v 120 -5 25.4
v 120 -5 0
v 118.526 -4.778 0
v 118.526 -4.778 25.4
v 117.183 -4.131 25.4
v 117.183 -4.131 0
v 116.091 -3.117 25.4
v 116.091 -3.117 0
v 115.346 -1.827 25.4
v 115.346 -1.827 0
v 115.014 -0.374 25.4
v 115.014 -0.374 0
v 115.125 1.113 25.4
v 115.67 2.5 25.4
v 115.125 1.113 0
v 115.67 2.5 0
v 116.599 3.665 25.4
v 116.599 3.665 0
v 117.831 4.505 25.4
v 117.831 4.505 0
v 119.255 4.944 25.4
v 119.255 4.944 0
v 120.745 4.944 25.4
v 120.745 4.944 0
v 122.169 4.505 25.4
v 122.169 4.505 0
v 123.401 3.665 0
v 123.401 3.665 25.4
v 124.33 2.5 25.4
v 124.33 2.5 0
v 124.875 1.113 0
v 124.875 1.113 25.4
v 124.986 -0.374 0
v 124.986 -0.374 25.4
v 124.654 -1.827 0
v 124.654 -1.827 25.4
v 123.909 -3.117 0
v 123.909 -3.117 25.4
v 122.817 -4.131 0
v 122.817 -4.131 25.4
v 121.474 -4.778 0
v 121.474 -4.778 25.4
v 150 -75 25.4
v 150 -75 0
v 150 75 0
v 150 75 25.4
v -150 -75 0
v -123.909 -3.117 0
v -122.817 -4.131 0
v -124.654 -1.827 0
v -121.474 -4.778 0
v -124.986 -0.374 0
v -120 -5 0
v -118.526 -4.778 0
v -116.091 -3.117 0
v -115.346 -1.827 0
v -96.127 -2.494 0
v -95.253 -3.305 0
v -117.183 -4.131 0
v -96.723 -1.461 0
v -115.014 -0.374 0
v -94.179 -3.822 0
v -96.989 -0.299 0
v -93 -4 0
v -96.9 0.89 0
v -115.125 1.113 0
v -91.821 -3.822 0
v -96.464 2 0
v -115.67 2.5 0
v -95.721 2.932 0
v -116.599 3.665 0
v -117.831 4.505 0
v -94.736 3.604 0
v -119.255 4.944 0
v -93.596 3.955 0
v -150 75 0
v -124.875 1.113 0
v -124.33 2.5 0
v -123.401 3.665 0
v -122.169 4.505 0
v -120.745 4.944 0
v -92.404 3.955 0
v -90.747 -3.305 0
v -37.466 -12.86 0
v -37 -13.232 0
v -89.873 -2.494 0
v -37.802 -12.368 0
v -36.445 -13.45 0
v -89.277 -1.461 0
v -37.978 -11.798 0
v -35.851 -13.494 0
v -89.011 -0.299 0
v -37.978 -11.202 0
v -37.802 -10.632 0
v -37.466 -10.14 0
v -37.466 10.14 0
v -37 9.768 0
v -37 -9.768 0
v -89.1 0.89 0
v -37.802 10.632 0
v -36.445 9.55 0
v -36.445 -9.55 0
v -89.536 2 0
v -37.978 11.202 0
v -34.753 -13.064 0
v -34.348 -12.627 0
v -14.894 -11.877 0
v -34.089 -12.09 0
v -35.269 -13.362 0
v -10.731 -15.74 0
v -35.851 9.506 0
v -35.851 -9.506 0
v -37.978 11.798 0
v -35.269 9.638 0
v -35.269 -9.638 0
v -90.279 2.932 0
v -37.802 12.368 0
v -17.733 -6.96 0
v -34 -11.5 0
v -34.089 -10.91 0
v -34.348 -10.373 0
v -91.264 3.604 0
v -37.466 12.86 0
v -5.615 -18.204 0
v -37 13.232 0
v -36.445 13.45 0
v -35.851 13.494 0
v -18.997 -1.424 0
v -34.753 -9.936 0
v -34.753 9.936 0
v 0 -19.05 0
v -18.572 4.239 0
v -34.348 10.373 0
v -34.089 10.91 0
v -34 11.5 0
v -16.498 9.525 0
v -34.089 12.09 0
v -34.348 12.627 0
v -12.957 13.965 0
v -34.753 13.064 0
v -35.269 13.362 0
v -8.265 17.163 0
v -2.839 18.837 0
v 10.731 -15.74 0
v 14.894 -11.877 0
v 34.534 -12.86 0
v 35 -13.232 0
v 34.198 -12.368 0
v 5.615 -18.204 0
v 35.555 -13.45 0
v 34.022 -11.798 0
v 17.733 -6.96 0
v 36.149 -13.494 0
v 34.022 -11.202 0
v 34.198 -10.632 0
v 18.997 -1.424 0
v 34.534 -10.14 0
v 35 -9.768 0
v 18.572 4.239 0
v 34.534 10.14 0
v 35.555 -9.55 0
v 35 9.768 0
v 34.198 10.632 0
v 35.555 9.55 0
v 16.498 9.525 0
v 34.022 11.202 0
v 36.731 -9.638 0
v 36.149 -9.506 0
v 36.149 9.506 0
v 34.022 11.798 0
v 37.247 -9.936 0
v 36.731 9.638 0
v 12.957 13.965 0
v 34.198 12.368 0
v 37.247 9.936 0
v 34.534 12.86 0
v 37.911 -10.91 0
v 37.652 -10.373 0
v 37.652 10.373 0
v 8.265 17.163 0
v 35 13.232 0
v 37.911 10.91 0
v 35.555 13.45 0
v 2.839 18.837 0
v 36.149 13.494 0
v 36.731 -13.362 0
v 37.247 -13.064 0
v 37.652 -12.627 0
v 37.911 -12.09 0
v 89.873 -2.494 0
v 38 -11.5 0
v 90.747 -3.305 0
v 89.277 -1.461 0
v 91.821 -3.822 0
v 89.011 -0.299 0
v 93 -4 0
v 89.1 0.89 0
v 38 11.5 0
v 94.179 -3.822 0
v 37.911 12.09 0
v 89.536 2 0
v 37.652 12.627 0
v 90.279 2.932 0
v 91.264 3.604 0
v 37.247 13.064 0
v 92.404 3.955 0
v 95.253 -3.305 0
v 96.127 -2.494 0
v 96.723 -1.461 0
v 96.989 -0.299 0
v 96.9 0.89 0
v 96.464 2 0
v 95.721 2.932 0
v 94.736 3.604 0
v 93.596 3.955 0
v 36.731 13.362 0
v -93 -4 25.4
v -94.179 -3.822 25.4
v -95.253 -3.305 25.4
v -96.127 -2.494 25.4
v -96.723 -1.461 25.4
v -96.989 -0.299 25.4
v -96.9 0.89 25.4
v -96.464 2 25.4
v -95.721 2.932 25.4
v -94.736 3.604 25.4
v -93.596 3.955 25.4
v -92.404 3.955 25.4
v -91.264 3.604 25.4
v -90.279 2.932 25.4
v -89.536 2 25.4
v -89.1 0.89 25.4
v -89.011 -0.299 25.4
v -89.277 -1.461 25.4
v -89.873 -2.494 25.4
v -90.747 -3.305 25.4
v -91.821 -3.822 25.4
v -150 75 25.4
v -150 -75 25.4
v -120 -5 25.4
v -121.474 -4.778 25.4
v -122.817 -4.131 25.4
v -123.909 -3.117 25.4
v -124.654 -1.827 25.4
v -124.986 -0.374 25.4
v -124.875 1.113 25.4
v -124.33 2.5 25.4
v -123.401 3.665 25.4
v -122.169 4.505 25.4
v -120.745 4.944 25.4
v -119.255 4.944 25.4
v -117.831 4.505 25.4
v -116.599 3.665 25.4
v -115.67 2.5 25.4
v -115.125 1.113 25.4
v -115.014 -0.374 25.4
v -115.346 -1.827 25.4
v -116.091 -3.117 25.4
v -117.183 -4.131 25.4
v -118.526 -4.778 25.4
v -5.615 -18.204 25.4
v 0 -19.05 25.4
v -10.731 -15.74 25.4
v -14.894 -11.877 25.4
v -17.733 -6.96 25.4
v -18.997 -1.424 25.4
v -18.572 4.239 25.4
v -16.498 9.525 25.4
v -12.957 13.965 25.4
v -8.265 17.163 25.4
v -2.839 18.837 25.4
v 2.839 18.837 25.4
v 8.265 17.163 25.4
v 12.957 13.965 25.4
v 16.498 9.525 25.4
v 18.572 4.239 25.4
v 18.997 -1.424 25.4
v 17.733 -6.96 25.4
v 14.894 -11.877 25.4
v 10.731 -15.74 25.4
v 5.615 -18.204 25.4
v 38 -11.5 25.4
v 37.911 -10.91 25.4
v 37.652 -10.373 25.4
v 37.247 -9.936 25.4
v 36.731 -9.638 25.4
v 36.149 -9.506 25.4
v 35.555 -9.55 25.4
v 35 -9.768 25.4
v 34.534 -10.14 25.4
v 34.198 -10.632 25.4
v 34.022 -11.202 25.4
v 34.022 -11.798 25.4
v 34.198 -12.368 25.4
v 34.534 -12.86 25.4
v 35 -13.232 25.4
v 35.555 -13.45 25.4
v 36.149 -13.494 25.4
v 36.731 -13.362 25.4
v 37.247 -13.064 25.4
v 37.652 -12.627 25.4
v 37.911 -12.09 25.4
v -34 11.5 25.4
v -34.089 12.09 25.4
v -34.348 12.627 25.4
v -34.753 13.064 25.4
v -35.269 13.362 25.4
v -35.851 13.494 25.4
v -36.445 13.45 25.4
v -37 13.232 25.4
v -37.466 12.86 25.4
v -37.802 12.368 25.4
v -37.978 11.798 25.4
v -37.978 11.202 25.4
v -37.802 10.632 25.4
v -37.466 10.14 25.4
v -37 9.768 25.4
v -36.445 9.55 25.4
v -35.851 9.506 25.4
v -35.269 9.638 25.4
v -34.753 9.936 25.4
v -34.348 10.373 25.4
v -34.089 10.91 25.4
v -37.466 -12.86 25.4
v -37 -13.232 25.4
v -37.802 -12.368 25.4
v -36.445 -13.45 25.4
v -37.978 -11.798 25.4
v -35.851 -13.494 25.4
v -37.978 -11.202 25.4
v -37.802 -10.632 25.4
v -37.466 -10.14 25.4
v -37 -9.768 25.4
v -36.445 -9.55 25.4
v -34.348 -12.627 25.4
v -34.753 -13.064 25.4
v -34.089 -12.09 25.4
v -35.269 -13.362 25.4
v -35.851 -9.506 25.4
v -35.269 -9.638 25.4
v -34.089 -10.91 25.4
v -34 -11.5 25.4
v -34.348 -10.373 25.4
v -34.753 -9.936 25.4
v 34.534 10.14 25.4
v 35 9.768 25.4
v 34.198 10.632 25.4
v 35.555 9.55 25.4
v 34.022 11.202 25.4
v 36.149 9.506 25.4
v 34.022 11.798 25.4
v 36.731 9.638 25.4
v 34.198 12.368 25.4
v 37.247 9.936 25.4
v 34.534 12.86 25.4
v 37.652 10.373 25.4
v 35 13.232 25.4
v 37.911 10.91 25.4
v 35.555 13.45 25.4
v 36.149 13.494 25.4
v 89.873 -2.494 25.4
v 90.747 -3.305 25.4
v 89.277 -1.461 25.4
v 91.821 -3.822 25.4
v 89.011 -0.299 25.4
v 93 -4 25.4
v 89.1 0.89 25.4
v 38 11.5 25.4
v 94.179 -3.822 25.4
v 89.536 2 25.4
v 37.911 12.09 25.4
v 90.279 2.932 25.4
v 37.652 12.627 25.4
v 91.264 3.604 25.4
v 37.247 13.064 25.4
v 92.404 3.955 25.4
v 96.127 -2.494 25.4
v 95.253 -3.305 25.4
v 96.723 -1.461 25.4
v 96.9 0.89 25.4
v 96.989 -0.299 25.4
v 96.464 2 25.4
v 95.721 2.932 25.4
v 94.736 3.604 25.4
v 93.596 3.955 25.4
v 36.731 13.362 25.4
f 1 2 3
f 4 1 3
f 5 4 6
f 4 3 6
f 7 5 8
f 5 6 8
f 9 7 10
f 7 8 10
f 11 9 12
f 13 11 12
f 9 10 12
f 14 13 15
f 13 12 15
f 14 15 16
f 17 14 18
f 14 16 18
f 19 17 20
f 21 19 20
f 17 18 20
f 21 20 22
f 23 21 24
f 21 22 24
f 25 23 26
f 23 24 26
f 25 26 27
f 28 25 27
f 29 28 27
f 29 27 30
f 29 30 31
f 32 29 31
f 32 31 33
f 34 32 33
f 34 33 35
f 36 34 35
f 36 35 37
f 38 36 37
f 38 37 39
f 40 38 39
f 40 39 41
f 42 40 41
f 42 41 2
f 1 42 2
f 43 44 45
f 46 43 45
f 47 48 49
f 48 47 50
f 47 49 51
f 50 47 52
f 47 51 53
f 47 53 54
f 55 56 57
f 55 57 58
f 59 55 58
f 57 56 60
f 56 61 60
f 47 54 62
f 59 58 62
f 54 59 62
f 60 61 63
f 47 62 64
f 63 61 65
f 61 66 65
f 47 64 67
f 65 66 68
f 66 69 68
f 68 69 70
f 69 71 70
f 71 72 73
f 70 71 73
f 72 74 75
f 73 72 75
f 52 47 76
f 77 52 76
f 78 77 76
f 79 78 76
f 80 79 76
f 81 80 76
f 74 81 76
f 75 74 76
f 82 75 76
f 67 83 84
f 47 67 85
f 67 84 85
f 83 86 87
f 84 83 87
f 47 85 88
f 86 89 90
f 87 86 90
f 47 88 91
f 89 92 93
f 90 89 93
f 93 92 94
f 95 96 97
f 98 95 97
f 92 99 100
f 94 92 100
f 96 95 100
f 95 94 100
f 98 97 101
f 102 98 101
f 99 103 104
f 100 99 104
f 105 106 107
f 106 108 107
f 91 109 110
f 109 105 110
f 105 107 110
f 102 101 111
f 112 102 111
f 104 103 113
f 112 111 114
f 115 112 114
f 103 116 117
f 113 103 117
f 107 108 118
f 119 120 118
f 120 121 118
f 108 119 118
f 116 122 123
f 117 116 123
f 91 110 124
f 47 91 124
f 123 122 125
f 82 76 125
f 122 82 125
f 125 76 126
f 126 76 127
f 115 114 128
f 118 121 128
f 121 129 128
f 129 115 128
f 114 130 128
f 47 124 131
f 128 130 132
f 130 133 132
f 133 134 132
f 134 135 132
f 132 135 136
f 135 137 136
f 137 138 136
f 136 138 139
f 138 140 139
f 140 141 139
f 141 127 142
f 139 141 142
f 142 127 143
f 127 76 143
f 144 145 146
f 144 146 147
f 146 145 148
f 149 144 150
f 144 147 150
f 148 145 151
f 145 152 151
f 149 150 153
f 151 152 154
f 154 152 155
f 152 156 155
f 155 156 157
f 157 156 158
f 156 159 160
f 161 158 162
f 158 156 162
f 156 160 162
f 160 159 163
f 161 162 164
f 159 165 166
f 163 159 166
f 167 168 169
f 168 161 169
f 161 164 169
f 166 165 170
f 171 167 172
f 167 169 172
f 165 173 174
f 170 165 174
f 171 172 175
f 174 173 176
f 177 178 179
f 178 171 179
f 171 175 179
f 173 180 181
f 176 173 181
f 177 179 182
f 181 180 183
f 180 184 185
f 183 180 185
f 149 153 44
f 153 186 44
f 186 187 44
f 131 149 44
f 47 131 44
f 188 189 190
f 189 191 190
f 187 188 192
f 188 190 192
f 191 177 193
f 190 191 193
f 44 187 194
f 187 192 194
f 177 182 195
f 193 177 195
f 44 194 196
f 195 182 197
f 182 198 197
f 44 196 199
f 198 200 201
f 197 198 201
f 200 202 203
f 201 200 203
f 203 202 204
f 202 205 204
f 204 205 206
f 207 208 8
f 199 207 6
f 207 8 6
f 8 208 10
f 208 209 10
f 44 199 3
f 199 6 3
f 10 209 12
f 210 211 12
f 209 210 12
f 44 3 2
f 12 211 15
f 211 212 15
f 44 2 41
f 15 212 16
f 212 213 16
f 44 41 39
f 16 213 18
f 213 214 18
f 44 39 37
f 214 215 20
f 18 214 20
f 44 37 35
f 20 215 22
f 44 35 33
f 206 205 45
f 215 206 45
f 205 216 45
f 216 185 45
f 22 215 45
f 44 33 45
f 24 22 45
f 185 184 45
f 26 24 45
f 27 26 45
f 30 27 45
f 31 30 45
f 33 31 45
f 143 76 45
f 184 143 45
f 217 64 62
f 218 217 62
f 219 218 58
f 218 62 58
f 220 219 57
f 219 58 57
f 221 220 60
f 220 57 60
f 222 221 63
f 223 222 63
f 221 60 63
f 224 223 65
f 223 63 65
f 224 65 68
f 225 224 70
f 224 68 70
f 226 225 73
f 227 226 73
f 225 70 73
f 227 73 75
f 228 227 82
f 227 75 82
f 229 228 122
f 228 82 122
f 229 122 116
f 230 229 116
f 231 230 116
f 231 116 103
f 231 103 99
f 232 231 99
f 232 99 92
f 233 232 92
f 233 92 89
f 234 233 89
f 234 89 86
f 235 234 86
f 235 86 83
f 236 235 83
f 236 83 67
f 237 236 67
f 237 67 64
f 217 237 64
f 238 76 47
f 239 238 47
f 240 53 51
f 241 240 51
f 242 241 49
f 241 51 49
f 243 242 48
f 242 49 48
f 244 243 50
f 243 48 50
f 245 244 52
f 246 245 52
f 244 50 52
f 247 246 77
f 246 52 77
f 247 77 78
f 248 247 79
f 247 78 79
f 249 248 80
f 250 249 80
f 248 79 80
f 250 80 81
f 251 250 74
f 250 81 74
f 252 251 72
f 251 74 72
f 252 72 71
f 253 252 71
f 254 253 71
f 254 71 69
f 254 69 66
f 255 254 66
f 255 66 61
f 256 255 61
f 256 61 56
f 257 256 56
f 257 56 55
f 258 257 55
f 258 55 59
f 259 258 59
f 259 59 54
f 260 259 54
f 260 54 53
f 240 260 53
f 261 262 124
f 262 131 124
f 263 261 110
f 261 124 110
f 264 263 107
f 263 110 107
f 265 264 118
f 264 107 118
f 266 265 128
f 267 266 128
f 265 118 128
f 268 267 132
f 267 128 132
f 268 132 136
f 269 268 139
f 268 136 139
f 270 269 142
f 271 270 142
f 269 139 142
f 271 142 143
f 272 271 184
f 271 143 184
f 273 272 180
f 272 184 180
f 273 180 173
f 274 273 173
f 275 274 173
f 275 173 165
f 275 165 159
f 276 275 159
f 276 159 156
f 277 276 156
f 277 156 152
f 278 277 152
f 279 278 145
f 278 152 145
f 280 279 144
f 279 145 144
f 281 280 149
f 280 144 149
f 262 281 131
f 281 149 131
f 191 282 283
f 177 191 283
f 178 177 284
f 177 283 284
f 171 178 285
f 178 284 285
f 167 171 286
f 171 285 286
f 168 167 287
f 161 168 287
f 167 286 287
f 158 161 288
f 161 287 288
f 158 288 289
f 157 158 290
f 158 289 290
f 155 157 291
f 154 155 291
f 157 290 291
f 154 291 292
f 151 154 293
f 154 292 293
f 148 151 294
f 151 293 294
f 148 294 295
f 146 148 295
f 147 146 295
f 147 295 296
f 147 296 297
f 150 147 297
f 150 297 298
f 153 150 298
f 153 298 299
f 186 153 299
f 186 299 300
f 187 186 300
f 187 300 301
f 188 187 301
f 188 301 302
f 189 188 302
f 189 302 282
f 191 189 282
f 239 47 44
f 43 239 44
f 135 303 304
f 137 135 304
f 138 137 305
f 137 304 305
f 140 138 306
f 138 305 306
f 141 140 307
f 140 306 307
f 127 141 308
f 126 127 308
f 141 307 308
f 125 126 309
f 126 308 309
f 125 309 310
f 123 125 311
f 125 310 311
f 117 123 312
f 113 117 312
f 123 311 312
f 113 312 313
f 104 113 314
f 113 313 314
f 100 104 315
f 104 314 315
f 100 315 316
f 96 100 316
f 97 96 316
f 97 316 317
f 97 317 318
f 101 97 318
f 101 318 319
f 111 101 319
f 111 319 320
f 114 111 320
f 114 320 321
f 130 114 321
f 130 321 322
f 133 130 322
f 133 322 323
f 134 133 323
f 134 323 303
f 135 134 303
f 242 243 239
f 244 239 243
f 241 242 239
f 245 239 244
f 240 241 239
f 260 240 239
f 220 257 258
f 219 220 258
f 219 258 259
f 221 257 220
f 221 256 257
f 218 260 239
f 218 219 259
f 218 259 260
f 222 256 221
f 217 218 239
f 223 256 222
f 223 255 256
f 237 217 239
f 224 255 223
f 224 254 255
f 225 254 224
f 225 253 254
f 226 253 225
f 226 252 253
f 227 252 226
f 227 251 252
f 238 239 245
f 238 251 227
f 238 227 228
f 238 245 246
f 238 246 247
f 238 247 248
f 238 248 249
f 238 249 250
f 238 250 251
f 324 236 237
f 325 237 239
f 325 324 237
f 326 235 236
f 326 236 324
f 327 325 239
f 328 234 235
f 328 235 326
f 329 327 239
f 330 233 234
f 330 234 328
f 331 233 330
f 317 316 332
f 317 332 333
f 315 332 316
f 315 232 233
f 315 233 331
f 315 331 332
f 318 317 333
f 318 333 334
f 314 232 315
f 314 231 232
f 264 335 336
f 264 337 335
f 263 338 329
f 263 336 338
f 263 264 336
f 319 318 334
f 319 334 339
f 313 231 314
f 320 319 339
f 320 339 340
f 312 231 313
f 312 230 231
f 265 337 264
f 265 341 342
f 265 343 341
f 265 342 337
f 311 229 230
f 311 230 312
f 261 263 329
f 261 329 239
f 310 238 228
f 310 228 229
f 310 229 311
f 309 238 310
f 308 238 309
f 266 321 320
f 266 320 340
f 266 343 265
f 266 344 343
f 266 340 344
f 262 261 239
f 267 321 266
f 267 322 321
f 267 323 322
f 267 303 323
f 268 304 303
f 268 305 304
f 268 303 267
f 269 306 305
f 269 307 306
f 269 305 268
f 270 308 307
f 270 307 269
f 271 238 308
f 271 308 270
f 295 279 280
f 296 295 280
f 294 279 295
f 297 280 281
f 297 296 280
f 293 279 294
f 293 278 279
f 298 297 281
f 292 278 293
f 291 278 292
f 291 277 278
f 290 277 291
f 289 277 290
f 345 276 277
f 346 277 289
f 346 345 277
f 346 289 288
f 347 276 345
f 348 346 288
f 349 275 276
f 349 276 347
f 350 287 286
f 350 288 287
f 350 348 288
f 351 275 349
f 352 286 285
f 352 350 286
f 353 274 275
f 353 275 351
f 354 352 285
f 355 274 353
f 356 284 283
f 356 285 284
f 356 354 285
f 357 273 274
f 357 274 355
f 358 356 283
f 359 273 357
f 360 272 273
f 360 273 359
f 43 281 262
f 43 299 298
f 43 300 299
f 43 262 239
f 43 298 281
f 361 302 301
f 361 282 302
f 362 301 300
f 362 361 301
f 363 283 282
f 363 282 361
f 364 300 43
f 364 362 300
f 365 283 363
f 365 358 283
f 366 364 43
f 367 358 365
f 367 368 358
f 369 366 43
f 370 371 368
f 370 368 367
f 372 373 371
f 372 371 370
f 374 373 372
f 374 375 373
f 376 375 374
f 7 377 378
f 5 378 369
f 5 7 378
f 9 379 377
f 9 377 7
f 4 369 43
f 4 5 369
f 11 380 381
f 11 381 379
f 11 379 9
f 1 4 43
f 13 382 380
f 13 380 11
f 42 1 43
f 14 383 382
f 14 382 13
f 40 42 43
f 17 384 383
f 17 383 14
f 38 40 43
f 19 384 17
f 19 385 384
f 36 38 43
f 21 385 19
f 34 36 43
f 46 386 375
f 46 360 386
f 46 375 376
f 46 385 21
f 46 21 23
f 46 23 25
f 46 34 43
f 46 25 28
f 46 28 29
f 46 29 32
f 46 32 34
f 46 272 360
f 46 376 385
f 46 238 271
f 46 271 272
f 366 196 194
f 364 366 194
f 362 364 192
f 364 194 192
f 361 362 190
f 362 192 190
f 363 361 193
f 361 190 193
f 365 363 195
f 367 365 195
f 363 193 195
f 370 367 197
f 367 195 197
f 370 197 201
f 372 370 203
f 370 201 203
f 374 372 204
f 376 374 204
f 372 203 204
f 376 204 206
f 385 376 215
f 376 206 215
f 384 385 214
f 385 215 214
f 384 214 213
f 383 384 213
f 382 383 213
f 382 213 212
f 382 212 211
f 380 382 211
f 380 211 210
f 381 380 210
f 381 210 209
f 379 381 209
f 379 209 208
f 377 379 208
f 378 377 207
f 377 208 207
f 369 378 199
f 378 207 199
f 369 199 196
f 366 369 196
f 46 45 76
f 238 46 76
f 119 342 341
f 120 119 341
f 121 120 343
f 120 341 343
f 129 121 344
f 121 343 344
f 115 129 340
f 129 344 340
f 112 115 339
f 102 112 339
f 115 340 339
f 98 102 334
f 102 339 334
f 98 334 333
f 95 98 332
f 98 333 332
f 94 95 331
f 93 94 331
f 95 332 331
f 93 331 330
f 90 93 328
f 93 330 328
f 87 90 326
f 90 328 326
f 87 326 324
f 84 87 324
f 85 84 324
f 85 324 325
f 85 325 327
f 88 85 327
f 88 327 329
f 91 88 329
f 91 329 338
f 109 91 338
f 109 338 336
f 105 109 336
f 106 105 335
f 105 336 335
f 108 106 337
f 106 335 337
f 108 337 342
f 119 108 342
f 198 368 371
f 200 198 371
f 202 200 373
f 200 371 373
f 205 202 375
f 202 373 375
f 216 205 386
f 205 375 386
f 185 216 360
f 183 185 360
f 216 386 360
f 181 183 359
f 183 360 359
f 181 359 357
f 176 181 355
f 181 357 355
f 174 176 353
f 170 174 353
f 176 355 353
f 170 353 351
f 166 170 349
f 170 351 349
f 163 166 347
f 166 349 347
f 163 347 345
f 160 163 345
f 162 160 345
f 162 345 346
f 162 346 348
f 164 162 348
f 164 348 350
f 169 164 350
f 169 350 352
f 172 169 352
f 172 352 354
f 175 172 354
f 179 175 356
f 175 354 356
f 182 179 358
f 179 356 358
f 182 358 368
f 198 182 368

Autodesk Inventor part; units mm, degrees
ref_plane "YZ Plane" through (0, 0, 0) normal (1, 0, 0) x (0, 1, 0)
ref_plane "XZ Plane" through (0, 0, 0) normal (0, 1, 0) x (-1, 0, 0)
ref_plane "XY Plane" through (0, 0, 0) normal (0, 0, 1) x (1, 0, 0)
sketch "Sketch1" plane through (0, 0, 0) normal (0, 0, 1) x (1, 0, 0)
  line L0 (-150, -75) -> (150, -75)
  line L1 (150, -75) -> (150, 75)
  line L2 (150, 75) -> (-150, 75)
  line L3 (-150, 75) -> (-150, -75)
  line L4 (-150, -75) -> (150, 75) construction
  line L5 (150, -75) -> (-150, 75) construction
  point P0 (0, 0)
  dimension "d0" = 300
  dimension "d1" = 150
extrude "Extrusion1" add sketch "Sketch1" along normal blind 25.4
sketch "Sketch2" plane through (0, 0, 25.4) normal (0, 0, 1) x (1, 0, 0)
  line L0 (-120, 0) -> (120, 0)
  line L1 (-150, 75) -> (-150, -75) projected
  point P0 (0, 0)
  point P1 (0, 0)
  dimension "d4" = 30
hole "Hole1" at (-120, 0, 25.4) at (120, 0, 25.4) direction (0, 0, -1) diameter 10 end through all
sketch "Sketch3" plane through (0, 0, 25.4) normal (0, 0, 1) x (1, 0, 0)
  line L0 (-93, 0) -> (93, 0)
  point P0 (0, 0)
  point P1 (0, 0)
  dimension "d26" = 186
hole "Hole2" at (-93, 0, 25.4) at (93, 0, 25.4) direction (0, 0, -1) diameter 8 end through all
sketch "Sketch4" plane through (0, 0, 25.4) normal (0, 0, 1) x (1, 0, 0)
  point P0 (0, 0)
  point P1 (0, 0)
hole "Hole3" at (0, 0, 25.4) direction (0, 0, -1) diameter 38.1 end through all
sketch "Sketch5" plane through (0, 0, 25.4) normal (0, 0, 1) x (1, 0, 0)
  circle A0 centre (-36, 11.5) radius 2
  line L0 (-150, 75) -> (-150, -75) construction
  line L1 (-150, 0) -> (150, 0) construction
  line L2 (150, -75) -> (150, 75) construction
  circle A1 centre (-36, -11.5) radius 2
  line L3 (150, 75) -> (-150, 75) construction
  line L4 (0, 75) -> (0, -75) construction
  line L5 (-150, -75) -> (150, -75) construction
  circle A2 centre (36, 11.5) radius 2
  circle A3 centre (36, -11.5) radius 2
  point P0 (0, 0)
  dimension "d27" = 4
  dimension "d28" = 36
  dimension "d29" = 11.5
extrude "Extrusion2" cut sketch "Sketch5" against normal up to next
properties part number "base de madera pequeña"
